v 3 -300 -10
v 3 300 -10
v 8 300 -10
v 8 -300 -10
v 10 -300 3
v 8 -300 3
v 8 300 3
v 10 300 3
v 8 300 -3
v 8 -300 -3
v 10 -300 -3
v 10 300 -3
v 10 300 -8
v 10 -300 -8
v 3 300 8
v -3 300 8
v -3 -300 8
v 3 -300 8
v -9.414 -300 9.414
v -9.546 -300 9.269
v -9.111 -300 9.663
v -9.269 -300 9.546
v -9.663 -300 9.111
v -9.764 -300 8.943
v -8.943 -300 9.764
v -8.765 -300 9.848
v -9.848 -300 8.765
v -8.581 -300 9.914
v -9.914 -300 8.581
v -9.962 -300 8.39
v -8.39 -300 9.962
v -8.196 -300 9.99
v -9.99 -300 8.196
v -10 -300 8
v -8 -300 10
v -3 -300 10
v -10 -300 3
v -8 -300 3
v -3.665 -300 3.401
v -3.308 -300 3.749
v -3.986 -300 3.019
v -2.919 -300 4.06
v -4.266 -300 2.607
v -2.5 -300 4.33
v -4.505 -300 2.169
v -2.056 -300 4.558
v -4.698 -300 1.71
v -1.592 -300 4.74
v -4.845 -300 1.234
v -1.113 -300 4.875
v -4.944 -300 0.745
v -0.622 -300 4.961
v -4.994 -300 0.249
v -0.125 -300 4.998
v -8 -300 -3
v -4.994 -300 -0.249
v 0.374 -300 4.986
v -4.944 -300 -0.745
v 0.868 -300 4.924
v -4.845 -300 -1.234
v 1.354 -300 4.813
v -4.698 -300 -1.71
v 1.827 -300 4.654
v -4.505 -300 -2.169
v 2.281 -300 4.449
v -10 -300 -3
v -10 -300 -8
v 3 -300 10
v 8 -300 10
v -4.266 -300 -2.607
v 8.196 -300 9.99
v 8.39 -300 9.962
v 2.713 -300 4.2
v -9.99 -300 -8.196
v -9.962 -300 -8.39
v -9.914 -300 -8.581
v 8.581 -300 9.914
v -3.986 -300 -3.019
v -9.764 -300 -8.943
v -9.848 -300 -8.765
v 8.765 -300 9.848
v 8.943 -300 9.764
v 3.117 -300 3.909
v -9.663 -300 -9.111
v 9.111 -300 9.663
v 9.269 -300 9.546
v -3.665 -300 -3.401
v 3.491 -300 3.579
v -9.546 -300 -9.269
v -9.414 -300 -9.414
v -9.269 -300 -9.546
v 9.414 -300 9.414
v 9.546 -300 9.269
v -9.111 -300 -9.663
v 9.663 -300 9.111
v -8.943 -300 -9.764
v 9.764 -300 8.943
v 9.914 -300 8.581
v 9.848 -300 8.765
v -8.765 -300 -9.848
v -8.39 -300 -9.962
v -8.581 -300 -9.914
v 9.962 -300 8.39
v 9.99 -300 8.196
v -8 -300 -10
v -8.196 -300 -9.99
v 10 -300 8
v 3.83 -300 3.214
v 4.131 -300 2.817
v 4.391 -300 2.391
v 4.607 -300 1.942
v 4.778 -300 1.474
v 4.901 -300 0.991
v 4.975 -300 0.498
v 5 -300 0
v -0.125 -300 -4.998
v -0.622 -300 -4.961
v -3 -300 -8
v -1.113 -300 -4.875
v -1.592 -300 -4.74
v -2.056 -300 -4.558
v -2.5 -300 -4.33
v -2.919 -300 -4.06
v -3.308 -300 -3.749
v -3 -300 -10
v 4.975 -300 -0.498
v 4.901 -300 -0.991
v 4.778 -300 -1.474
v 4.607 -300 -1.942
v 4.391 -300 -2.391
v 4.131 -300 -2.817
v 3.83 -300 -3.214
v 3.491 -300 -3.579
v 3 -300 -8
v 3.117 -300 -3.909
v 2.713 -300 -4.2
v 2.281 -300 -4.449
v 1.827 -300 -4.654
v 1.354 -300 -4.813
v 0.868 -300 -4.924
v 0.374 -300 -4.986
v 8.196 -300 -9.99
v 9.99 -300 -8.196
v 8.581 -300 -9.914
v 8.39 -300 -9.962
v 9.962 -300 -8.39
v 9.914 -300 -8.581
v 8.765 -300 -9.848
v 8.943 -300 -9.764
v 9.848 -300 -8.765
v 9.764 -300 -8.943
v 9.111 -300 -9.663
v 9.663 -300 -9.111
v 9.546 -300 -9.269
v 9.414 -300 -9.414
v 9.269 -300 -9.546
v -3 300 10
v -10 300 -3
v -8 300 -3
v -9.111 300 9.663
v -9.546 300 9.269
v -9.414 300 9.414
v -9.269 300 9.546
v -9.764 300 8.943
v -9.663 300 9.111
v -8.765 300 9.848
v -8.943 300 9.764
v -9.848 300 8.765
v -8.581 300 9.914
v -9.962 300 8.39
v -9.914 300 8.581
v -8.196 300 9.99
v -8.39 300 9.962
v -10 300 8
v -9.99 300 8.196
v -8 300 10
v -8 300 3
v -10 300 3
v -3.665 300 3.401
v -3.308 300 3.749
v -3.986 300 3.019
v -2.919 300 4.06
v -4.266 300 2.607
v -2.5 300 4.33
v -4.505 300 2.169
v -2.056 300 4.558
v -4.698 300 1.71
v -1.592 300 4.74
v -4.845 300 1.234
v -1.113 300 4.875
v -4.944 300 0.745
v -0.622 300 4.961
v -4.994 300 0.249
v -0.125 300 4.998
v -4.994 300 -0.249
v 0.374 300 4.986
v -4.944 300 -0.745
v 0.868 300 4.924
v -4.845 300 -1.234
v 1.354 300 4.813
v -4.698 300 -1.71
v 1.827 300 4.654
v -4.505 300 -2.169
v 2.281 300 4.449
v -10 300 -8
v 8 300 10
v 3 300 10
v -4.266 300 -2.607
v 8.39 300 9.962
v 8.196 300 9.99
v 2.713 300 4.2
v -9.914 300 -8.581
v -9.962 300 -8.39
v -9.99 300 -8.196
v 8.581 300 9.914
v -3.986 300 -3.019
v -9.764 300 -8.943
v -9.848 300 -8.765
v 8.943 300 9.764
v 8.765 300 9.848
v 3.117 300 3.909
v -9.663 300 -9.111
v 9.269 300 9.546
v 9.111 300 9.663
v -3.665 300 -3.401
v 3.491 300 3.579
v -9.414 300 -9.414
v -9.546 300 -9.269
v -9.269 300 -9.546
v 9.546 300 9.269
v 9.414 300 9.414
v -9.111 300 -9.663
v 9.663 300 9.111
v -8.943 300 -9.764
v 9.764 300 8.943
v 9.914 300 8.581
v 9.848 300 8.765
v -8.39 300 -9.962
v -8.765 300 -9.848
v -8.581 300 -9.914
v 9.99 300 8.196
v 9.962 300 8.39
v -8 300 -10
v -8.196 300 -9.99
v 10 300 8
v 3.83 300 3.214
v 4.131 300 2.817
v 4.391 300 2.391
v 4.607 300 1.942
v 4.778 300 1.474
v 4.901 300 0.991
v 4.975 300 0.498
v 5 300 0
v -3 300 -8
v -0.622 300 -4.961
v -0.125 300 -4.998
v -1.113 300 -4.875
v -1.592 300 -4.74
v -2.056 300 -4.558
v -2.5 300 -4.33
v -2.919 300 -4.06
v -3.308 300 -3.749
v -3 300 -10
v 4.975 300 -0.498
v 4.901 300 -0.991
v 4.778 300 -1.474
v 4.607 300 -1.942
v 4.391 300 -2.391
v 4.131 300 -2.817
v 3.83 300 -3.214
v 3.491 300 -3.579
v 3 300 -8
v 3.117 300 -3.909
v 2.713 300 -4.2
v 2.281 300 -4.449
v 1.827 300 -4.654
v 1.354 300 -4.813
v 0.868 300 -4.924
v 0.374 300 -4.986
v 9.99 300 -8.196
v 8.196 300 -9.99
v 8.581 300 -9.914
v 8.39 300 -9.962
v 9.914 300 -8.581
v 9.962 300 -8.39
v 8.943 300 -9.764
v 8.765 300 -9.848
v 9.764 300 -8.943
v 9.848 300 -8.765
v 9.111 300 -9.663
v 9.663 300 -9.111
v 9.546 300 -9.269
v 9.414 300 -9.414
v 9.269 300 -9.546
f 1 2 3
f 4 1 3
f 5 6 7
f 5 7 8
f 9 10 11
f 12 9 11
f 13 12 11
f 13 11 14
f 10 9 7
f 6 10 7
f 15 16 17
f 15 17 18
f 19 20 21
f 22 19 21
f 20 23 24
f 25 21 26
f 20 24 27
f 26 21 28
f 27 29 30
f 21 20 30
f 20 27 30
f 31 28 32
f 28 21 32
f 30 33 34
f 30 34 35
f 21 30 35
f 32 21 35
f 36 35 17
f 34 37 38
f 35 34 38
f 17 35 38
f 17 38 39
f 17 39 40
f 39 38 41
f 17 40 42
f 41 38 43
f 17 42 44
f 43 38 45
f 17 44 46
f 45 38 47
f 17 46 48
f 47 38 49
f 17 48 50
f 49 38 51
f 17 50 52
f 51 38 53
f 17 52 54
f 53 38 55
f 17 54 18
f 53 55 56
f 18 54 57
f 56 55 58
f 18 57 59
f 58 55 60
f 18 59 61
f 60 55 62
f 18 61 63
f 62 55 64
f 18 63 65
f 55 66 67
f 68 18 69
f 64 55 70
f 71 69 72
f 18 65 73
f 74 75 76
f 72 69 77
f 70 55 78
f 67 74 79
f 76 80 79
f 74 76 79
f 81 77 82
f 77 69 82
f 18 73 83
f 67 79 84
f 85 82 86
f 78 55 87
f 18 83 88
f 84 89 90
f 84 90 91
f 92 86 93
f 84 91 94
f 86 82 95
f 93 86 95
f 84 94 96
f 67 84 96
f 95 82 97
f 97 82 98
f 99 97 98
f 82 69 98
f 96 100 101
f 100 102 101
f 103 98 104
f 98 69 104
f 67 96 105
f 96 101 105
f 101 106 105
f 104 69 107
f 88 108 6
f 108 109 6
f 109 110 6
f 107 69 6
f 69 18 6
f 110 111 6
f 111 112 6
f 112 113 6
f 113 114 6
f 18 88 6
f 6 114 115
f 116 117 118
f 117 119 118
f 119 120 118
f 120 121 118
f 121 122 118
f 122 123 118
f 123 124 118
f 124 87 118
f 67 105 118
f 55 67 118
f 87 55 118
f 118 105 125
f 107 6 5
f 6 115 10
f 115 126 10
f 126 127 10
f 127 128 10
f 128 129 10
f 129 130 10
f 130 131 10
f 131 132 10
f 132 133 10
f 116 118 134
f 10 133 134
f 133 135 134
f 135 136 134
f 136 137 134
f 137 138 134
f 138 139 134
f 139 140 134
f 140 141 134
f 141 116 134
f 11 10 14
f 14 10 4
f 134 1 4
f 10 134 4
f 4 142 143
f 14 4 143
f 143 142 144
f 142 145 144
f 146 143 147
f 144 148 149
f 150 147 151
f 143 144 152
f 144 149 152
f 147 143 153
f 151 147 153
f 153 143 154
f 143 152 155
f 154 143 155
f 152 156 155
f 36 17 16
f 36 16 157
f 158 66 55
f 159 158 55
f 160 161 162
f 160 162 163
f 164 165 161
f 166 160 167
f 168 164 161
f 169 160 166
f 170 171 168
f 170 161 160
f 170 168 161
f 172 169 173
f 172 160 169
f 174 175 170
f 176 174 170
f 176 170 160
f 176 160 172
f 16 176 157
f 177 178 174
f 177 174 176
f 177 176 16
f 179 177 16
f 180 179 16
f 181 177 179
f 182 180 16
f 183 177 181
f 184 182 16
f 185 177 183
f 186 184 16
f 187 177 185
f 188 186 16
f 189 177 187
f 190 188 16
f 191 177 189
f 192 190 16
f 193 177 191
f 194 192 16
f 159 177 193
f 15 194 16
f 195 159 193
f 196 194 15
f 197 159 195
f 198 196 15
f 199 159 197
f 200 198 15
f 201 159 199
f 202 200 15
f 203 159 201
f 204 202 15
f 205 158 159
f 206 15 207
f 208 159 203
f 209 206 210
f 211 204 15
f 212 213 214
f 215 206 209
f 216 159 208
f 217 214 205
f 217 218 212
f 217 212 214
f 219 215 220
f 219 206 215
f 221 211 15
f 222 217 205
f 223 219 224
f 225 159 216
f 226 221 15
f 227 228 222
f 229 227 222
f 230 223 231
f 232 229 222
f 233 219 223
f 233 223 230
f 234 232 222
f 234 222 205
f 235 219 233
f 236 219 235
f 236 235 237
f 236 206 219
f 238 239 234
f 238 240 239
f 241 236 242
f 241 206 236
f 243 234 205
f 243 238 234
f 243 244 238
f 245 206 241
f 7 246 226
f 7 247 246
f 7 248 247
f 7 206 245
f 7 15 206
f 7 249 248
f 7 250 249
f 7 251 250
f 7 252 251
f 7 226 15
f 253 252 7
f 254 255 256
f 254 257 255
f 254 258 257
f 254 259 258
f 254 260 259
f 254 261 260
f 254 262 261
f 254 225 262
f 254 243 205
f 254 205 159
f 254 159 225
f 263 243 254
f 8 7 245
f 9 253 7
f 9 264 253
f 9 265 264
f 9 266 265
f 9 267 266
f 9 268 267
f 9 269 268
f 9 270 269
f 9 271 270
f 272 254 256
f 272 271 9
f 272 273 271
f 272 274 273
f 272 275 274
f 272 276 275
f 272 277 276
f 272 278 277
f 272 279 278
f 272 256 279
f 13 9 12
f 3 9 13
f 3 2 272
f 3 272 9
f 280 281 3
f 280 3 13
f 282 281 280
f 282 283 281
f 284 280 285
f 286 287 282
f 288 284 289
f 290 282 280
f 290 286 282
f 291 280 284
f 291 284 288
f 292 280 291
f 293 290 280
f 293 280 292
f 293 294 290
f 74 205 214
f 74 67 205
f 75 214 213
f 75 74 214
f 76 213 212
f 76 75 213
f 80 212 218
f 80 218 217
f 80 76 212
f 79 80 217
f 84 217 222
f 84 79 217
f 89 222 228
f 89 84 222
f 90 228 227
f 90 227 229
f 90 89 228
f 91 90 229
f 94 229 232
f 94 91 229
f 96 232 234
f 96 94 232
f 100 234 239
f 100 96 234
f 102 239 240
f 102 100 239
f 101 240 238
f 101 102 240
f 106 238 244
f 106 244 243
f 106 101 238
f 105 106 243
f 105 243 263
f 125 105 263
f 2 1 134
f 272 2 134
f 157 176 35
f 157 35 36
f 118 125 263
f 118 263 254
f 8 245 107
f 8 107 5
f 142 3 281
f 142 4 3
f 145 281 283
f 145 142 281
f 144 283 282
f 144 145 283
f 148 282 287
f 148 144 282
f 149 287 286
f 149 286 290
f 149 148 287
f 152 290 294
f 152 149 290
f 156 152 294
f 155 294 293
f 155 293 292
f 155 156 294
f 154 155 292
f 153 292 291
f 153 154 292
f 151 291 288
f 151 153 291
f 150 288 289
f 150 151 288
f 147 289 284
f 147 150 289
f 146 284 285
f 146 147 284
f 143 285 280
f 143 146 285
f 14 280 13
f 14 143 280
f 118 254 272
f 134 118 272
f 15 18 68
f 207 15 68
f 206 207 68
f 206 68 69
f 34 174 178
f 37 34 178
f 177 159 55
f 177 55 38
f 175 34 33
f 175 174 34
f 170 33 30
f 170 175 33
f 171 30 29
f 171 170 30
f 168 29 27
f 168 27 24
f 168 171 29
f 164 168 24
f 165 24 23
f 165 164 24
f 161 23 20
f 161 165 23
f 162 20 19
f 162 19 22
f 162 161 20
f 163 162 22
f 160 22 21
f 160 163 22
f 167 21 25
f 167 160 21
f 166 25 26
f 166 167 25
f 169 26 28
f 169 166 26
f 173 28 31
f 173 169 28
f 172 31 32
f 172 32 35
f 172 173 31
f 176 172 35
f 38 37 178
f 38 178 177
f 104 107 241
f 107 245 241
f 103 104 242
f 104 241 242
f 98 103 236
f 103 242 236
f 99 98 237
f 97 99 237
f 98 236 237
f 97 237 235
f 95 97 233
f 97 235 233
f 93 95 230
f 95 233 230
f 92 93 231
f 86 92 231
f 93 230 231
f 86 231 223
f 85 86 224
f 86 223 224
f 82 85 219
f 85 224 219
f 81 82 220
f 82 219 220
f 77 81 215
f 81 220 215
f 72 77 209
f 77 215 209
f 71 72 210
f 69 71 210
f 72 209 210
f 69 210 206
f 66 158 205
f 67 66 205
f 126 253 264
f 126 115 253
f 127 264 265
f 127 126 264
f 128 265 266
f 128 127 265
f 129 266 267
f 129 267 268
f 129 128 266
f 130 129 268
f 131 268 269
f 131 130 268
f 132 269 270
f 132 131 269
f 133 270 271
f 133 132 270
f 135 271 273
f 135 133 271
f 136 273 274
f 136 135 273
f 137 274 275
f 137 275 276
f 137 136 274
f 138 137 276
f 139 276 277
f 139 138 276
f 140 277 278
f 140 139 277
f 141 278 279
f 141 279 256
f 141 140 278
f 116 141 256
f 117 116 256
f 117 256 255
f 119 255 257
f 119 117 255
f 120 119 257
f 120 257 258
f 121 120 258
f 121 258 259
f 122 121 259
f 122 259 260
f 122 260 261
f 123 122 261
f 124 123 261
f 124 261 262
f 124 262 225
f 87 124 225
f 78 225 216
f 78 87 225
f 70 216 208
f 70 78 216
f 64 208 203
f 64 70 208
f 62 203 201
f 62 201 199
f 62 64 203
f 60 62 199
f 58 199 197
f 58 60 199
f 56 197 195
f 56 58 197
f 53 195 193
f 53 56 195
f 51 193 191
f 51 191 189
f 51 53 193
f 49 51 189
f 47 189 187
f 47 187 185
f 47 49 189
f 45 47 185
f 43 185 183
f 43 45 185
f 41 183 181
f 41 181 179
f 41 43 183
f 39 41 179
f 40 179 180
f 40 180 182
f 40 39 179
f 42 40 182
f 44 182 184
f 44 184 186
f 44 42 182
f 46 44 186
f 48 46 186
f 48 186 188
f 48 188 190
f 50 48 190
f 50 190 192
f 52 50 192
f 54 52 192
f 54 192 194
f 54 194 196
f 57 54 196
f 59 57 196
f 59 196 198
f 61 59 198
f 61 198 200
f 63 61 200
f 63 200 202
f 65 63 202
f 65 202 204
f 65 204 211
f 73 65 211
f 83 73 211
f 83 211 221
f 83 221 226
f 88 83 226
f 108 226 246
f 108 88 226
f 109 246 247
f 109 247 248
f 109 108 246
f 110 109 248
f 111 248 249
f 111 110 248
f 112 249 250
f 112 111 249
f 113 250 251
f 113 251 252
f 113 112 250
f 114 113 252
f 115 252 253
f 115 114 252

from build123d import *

# Parameters (mm, degrees)
SKETCH1_W           = 20
SKETCH1_H           = 20
SKETCH1_R           = 5
BOSS_EXTRUDE2_DEPTH = 300
SKETCH2_W           = 6
SKETCH2_H           = 4
SKETCH2_W_2         = 4
SKETCH2_H_2         = 6
CUT_EXTRUDE1_DEPTH  = 600
FILLET1_R           = 2


with BuildPart() as part:
    # Sketch1 → Boss-Extrude2 (new body, symmetric)
    with BuildSketch(Plane(origin=(0, 0, 0), x_dir=(1, 0, 0), z_dir=(0, 1, 0))):
        Rectangle(SKETCH1_W, SKETCH1_H)
        Circle(SKETCH1_R, mode=Mode.SUBTRACT)
    extrude(amount=BOSS_EXTRUDE2_DEPTH, both=True)

    # Sketch2 → Cut-Extrude1 (cut)
    with BuildSketch(Plane.XZ.offset(300)):
        with Locations((0, 10)):
            Rectangle(SKETCH2_W, SKETCH2_H)
        with Locations((10, 0)):
            Rectangle(SKETCH2_W_2, SKETCH2_H_2)
        with Locations((0, -10)):
            Rectangle(SKETCH2_W, SKETCH2_H)
        with Locations((-10, 0)):
            Rectangle(SKETCH2_W_2, SKETCH2_H_2)
    extrude(amount=-CUT_EXTRUDE1_DEPTH, mode=Mode.SUBTRACT)

    # Fillet1
    fillet1_edges = [part.edges().sort_by_distance(p)[0] for p in [
        (10, 0, 10),
        (-10, 0, 10),
        (-10, 0, -10),
        (10, 0, -10),
    ]]
    fillet(fillet1_edges, radius=FILLET1_R)


solid = part.part
